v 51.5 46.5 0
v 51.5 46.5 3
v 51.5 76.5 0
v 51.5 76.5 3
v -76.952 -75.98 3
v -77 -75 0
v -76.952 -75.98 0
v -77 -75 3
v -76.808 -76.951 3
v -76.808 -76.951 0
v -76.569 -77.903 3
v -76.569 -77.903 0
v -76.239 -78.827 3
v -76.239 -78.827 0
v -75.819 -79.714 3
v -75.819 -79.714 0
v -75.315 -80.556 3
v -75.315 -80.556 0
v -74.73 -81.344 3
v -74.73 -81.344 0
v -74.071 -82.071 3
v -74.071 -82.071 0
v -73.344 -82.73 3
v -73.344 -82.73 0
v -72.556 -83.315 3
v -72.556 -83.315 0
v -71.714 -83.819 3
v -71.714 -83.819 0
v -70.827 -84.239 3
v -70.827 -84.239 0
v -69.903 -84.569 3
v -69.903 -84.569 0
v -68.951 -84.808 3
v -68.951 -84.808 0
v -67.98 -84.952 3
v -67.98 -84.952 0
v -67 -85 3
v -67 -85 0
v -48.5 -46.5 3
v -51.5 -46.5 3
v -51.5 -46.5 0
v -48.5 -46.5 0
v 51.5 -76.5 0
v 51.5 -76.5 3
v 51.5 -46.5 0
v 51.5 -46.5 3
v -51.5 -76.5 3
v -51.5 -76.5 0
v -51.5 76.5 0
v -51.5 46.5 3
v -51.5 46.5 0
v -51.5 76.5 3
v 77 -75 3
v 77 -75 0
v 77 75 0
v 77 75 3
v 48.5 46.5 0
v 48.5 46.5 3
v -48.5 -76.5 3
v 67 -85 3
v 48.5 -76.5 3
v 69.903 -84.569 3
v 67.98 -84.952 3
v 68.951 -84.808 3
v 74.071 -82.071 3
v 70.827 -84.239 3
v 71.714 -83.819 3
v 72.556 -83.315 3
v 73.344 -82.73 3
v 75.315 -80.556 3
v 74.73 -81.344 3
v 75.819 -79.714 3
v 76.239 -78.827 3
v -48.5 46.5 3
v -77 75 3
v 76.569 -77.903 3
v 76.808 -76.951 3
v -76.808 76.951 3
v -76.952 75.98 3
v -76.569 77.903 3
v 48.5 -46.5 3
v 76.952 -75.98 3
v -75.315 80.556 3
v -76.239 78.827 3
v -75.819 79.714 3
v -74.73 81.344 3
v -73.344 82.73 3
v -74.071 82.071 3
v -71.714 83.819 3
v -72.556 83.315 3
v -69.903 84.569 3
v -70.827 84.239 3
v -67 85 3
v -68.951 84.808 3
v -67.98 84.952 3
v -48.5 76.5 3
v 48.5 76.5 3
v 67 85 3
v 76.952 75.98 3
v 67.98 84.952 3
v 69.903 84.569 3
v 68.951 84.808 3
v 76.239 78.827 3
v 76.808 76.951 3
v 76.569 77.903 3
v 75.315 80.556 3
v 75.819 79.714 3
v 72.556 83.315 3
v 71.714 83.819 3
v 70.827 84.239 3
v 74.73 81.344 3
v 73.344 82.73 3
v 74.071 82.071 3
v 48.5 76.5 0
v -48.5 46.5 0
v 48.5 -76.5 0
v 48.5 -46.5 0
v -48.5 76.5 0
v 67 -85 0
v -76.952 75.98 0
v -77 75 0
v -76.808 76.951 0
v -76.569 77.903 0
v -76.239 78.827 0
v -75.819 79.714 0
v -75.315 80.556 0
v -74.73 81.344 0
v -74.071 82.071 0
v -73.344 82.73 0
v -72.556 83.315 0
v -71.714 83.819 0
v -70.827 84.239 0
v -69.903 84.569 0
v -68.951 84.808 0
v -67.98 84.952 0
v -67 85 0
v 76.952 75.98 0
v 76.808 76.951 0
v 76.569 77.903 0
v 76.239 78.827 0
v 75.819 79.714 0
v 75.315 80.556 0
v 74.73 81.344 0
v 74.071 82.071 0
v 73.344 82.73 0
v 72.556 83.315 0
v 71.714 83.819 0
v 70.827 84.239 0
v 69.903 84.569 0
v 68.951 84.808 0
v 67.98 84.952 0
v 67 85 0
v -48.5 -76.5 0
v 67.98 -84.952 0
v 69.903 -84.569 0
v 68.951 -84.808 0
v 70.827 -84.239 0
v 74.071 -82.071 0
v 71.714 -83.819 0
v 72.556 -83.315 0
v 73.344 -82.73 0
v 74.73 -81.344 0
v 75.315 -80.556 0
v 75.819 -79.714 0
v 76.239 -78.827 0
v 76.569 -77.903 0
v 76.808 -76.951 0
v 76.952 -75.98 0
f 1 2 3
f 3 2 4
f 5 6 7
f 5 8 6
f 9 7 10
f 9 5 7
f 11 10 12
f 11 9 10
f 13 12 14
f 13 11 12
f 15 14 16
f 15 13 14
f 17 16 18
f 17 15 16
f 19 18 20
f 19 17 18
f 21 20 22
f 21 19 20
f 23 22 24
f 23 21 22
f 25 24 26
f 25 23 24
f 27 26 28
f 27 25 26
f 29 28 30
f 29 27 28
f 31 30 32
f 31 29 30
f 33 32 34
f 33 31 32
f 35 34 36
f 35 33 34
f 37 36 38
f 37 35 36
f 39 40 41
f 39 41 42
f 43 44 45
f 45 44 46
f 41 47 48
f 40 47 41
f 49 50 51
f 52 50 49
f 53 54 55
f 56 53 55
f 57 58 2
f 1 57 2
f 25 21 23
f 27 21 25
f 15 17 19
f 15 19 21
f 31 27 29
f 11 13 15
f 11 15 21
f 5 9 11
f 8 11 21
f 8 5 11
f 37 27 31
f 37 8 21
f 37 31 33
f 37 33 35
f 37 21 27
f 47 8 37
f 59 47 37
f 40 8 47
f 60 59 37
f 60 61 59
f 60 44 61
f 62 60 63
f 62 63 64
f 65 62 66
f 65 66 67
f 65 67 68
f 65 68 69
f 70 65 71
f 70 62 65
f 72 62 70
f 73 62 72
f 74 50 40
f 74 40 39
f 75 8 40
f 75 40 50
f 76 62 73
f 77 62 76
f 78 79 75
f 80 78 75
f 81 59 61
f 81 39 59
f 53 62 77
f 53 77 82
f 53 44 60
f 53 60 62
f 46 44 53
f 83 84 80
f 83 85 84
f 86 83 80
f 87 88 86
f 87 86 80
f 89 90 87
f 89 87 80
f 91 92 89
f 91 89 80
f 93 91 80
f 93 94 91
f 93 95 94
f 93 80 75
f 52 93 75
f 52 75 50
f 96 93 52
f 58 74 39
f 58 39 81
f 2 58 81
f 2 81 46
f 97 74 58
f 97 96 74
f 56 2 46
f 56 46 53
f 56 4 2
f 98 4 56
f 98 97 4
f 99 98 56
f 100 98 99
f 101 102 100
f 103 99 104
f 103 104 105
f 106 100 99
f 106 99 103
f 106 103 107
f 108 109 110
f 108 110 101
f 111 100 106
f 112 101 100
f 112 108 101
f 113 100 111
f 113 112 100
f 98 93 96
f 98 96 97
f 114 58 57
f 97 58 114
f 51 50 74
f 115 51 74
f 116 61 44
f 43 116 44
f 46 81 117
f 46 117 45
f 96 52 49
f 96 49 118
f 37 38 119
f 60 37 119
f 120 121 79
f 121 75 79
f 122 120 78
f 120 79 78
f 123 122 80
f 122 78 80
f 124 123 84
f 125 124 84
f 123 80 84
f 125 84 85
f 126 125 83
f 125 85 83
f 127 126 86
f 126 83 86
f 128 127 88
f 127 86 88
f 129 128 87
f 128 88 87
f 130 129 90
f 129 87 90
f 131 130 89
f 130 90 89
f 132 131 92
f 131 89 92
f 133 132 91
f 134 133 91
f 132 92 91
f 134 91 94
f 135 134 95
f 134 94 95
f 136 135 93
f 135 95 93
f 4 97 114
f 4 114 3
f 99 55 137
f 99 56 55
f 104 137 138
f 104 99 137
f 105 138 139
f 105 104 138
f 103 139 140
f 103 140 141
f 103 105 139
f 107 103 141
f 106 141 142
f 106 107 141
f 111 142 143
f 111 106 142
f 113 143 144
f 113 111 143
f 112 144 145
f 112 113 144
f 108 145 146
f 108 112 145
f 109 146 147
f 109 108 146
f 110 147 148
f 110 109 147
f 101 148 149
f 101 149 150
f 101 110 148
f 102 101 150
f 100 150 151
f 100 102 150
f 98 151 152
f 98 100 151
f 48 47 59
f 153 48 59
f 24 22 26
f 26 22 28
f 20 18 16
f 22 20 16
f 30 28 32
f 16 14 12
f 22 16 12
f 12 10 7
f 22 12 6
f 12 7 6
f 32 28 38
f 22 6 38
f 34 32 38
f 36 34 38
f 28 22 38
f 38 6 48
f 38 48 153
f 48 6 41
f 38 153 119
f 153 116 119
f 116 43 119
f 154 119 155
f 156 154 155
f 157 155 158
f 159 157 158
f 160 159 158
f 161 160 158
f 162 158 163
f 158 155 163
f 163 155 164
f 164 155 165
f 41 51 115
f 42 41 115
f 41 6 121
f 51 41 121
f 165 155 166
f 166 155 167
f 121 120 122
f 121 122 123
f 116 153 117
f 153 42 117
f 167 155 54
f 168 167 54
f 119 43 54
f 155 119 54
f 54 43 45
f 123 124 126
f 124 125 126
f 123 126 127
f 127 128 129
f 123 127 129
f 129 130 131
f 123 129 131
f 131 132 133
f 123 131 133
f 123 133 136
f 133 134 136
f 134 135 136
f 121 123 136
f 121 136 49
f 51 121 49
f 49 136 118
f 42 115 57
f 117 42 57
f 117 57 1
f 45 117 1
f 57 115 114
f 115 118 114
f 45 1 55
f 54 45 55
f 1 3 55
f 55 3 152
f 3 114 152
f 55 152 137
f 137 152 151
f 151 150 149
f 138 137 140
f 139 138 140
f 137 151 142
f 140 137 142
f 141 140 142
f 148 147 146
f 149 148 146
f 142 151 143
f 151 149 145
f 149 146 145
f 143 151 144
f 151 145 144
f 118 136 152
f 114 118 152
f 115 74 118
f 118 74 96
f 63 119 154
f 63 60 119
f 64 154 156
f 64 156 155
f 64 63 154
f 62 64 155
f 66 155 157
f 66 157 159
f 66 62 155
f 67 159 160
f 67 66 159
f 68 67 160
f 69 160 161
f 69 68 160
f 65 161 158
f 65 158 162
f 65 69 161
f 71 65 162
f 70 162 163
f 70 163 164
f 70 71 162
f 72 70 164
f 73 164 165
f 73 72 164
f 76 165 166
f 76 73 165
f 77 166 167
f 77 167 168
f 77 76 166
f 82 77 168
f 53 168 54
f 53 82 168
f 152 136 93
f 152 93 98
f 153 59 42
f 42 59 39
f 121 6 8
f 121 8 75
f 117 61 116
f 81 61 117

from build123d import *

# Parameters (mm, degrees)
ESBO_O1_W                = 154
ESBO_O1_H                = 170
RESSALTO_EXTRUS_O1_DEPTH = 3
FILETE1_R                = 10
ESBO_O2_W                = 3
ESBO_O2_H                = 30
CORTE_EXTRUS_O1_DEPTH    = 115.730118103


with BuildPart() as part:
    # Esboço1 → Ressalto-extrusão1 (new body)
    with BuildSketch(Plane.XY):
        Rectangle(ESBO_O1_W, ESBO_O1_H)
    extrude(amount=RESSALTO_EXTRUS_O1_DEPTH)

    # Filete1
    filete1_edges = [part.edges().sort_by_distance(p)[0] for p in [
        (77, -85, 1.5),
        (-77, -85, 1.5),
        (-77, 85, 1.5),
        (77, 85, 1.5),
    ]]
    fillet(filete1_edges, radius=FILETE1_R)

    # Esboço2 → Corte-extrusão1 (cut, through all)
    with BuildSketch(Plane.XY.offset(3)):
        with Locations((-50, 61.5)):
            Rectangle(ESBO_O2_W, ESBO_O2_H)
        with Locations((50, 61.5)):
            Rectangle(ESBO_O2_W, ESBO_O2_H)
        with Locations((50, -61.5)):
            Rectangle(ESBO_O2_W, ESBO_O2_H)
        with Locations((-50, -61.5)):
            Rectangle(ESBO_O2_W, ESBO_O2_H)
    extrude(amount=-CORTE_EXTRUS_O1_DEPTH, mode=Mode.SUBTRACT)


solid = part.part
